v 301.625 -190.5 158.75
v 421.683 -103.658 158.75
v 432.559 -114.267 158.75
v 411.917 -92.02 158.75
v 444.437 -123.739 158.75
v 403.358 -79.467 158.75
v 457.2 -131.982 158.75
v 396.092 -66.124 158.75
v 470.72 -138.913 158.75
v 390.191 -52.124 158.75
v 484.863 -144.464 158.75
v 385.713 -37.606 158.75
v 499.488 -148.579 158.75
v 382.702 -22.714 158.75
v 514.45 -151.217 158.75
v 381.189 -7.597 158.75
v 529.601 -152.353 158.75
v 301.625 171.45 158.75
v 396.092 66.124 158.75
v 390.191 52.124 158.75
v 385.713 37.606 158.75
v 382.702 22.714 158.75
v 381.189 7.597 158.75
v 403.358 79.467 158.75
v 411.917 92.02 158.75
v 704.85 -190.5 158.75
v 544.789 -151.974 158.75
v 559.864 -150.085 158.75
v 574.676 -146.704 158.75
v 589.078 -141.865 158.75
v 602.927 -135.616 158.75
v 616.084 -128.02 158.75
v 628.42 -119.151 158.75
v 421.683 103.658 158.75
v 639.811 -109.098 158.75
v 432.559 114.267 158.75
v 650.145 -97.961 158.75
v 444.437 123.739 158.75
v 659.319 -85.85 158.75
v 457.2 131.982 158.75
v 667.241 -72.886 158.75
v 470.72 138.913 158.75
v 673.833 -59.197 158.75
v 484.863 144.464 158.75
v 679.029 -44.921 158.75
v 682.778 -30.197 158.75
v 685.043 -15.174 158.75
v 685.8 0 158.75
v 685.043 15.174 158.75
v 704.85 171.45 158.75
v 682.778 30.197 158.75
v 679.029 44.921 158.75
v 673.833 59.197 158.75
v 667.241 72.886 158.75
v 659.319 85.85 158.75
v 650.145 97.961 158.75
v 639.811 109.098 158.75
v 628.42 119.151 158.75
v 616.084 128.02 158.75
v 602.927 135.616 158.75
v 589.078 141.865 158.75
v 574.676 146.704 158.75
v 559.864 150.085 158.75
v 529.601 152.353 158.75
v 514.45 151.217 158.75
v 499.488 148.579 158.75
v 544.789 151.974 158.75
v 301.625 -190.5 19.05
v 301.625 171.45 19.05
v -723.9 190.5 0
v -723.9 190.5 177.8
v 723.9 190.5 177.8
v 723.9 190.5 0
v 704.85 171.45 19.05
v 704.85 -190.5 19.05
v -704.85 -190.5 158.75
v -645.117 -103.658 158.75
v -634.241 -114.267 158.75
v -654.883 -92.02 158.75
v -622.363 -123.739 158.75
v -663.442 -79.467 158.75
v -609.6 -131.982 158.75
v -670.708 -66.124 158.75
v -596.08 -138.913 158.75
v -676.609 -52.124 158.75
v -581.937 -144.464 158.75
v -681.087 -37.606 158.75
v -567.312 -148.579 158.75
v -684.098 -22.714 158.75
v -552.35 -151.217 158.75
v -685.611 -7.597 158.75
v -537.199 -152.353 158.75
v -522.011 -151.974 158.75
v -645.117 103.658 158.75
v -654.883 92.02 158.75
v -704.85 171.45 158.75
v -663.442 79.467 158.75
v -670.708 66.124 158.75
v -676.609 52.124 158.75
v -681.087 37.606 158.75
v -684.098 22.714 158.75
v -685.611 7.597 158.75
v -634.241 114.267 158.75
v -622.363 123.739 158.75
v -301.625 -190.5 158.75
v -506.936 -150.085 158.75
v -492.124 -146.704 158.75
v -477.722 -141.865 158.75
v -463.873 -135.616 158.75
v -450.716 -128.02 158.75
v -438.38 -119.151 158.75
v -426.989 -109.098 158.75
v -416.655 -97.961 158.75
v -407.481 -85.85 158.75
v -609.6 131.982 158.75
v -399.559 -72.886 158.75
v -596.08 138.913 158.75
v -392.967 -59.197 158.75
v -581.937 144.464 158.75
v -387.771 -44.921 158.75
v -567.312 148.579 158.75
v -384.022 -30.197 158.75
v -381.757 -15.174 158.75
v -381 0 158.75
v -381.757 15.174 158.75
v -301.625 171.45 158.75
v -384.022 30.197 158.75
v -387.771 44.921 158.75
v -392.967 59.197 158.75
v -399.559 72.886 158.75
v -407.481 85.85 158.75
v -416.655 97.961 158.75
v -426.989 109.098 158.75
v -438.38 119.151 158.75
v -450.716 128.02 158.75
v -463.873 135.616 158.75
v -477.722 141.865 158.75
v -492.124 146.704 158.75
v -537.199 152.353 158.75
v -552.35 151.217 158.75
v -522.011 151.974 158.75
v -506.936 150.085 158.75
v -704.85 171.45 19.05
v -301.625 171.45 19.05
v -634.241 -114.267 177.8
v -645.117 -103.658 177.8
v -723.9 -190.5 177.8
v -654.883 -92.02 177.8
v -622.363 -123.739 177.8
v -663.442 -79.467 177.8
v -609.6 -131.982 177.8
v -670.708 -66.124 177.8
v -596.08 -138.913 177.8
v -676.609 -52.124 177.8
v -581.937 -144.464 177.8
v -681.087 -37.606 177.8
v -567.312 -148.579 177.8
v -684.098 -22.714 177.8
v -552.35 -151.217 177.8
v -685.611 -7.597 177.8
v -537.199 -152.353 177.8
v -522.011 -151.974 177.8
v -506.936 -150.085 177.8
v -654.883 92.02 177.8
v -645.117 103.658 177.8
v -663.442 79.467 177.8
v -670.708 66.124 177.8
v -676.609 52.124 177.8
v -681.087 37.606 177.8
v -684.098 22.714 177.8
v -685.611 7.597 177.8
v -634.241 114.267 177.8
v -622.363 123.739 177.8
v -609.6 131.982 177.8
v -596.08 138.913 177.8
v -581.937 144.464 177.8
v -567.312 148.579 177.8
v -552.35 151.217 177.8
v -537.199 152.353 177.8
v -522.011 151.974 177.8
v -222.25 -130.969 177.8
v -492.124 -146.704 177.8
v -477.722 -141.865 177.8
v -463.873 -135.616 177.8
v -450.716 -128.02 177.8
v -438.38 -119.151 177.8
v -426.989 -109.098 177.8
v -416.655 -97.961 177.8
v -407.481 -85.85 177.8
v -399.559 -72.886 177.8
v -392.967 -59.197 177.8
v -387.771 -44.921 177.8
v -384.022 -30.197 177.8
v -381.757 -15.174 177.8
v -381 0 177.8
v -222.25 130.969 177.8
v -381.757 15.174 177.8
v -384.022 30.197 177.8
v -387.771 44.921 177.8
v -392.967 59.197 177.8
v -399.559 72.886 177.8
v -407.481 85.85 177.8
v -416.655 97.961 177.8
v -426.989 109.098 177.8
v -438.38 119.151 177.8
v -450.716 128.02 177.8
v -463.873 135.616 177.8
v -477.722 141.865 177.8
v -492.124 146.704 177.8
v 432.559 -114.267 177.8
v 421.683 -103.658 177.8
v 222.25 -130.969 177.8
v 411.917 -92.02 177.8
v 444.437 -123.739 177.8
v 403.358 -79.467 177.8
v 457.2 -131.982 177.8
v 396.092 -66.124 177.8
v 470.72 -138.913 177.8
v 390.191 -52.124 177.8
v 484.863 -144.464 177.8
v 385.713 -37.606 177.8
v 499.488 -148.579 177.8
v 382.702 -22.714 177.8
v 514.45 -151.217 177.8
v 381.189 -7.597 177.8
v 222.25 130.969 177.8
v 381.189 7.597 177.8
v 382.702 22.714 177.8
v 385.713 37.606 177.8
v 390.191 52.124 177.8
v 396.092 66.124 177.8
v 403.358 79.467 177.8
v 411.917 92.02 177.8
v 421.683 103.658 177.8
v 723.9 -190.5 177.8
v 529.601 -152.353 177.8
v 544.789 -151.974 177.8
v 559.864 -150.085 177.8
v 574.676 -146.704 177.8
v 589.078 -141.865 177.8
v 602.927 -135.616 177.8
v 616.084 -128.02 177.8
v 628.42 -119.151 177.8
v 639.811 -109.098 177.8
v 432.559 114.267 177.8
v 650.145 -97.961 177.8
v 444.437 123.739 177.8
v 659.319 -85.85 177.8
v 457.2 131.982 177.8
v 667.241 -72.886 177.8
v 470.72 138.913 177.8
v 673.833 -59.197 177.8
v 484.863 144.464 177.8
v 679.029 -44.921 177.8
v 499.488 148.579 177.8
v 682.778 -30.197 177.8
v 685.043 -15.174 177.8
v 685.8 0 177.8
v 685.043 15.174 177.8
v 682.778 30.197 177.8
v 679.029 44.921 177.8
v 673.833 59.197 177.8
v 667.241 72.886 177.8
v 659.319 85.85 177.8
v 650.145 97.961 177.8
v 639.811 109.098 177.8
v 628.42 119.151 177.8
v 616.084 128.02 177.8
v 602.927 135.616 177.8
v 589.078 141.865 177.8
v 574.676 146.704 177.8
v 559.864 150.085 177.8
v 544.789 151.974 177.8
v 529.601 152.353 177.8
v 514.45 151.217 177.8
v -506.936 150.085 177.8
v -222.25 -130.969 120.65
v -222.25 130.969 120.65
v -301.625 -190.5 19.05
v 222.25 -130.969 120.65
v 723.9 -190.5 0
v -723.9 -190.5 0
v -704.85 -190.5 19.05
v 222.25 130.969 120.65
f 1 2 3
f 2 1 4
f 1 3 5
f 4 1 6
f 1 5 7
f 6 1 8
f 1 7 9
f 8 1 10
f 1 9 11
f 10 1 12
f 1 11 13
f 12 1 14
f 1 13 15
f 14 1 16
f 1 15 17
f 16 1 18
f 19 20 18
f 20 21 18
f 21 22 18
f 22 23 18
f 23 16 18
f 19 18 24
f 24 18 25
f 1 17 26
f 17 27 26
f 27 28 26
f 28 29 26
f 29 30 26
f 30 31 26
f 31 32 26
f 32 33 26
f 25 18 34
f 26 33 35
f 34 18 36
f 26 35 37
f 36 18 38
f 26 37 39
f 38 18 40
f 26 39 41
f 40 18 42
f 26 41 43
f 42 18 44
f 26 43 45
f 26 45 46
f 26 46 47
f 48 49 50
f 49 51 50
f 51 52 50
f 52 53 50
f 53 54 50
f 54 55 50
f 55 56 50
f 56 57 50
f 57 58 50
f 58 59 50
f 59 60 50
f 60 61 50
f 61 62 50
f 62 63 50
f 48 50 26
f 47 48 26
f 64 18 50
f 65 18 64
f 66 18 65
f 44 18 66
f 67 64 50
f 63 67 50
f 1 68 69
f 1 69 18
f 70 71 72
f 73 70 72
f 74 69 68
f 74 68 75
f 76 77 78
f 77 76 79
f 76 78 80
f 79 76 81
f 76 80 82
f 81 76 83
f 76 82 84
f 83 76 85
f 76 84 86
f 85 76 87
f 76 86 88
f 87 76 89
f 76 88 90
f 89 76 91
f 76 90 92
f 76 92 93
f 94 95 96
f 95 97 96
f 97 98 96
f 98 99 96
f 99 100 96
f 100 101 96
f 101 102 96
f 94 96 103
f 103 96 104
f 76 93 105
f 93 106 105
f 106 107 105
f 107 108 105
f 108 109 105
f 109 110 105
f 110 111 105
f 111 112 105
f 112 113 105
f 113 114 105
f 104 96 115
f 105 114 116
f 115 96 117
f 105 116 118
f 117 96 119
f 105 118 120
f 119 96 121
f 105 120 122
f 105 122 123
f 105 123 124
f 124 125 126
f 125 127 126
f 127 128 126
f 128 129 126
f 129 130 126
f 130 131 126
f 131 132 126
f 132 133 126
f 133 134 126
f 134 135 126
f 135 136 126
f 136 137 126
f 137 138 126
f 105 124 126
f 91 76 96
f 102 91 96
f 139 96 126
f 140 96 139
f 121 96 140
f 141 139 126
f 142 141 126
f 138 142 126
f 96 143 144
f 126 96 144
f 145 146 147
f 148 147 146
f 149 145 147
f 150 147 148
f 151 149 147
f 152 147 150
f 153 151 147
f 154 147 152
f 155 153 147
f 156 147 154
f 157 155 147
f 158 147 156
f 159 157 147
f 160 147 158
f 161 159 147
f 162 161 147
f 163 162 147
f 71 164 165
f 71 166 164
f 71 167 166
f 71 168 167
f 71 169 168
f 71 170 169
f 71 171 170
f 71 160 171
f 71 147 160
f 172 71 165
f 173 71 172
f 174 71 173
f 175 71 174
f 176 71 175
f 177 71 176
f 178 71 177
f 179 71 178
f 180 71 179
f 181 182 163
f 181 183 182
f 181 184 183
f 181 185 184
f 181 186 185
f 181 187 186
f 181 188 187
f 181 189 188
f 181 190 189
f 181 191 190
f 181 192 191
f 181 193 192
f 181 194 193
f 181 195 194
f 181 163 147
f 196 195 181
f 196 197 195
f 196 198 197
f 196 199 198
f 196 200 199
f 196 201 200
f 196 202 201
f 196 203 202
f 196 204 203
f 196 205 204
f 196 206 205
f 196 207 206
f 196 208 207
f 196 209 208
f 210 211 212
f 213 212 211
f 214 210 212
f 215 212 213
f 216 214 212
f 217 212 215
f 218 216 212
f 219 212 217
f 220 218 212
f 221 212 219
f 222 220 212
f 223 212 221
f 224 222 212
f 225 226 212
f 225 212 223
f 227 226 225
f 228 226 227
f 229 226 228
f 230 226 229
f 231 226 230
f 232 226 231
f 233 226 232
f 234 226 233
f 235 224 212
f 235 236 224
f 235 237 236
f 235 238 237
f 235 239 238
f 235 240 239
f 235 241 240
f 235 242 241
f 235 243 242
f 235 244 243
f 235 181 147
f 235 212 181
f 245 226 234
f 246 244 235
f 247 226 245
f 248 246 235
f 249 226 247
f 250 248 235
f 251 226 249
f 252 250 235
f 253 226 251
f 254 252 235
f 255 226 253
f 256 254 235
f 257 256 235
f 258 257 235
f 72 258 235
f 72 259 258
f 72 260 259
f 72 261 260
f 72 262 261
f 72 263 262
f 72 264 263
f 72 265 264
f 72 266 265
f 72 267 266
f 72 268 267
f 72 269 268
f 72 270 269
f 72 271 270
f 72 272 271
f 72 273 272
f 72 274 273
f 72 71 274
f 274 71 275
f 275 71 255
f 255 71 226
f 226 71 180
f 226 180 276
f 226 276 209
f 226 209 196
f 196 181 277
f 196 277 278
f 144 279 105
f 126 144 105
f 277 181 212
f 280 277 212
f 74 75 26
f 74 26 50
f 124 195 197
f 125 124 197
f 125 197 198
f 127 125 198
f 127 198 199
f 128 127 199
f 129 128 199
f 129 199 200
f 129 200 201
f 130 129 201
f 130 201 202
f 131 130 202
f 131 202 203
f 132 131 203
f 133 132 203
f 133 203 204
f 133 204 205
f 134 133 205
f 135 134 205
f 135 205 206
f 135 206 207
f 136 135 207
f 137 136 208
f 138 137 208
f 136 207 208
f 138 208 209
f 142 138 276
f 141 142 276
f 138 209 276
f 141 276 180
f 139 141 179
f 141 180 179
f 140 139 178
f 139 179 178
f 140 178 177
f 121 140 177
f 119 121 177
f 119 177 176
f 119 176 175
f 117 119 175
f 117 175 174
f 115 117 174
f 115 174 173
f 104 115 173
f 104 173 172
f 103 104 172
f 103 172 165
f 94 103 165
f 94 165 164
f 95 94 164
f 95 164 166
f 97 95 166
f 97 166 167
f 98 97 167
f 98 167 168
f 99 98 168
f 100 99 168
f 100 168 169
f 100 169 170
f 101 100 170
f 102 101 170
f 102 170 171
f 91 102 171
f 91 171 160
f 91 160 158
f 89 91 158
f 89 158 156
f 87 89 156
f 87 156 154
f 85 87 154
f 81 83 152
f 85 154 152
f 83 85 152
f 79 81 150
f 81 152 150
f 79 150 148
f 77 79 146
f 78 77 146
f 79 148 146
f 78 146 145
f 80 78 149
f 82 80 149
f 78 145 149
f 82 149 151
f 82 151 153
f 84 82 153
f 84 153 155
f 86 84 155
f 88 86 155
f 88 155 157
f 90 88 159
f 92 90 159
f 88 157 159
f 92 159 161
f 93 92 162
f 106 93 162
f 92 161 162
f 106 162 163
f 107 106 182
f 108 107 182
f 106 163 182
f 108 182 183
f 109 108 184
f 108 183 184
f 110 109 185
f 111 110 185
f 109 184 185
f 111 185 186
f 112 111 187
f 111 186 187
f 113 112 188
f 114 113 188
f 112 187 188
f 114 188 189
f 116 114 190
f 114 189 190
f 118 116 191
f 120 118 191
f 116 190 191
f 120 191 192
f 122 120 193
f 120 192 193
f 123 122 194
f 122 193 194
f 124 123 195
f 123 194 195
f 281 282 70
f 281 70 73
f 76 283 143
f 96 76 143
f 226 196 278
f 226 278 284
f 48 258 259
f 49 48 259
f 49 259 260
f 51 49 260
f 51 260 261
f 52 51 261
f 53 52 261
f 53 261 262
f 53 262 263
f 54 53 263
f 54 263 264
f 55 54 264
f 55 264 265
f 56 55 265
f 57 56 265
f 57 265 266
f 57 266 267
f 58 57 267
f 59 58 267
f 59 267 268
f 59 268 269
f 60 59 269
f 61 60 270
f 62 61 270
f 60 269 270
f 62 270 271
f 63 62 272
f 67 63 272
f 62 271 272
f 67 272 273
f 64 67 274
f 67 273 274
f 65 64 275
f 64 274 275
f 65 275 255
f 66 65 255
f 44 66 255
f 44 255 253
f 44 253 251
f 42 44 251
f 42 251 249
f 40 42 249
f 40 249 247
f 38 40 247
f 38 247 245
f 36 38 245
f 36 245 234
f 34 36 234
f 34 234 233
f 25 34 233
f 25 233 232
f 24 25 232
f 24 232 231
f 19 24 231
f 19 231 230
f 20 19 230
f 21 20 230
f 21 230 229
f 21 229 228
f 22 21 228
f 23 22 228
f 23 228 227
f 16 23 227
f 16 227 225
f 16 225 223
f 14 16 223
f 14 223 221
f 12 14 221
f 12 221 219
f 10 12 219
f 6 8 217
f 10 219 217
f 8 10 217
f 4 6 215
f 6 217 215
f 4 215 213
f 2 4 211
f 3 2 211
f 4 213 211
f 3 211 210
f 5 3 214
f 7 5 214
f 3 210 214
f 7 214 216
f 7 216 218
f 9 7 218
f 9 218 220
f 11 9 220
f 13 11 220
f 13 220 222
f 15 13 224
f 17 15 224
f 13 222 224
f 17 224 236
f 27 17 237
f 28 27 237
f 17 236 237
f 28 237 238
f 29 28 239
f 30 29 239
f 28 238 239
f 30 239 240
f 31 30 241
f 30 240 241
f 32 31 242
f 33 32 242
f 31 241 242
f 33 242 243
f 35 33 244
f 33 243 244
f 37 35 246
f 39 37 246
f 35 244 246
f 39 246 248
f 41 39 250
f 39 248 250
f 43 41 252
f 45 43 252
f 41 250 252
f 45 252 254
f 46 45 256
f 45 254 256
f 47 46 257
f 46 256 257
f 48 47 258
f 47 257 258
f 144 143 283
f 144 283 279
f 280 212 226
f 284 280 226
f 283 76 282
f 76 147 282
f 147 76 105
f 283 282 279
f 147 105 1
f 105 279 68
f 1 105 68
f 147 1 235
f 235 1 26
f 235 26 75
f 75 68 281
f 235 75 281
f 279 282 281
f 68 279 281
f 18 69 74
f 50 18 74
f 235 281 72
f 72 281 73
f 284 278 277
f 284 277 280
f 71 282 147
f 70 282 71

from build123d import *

# Parameters (mm, degrees)
F0_W     = 1447.8
F0_H     = 381
F1_DEPTH = 177.8
F4_T     = -19.05
F2_R     = 152.4
F5_DEPTH = 25.4
F3_W     = 603.25
F3_H     = 177.8
F6_DEPTH = 381
F2_W     = 444.5
F2_H     = 261.9375
F7_DEPTH = 57.15


with BuildPart() as f1:
    # F0 (on Top) → F1 (new body)
    with BuildSketch(Plane.XY):
        Rectangle(F0_W, F0_H)
    extrude(amount=F1_DEPTH)

    # F4
    f4_openings = [f1.faces().sort_by_distance(p)[0] for p in [
        (0, -190.5, 88.9),
    ]]
    offset(amount=F4_T, openings=f4_openings)

    # F2 (on face) → F5 (cut)
    with BuildSketch(Plane.XY.offset(177.8)):
        with Locations((-533.4, 0)):
            Circle(F2_R)
        with Locations((533.4, 0)):
            Circle(F2_R)
    extrude(amount=-F5_DEPTH, mode=Mode.SUBTRACT)

    # F3 (on face) → F6 (join)
    with BuildSketch(Plane.XZ.offset(190.5)):
        with Locations((0, 88.9)):
            Rectangle(F3_W, F3_H)
    extrude(amount=-F6_DEPTH)

    # F2 (on face) → F7 (cut)
    with BuildSketch(Plane.XY.offset(177.8)):
        Rectangle(F2_W, F2_H)
    extrude(amount=-F7_DEPTH, mode=Mode.SUBTRACT)


solid = f1.part
